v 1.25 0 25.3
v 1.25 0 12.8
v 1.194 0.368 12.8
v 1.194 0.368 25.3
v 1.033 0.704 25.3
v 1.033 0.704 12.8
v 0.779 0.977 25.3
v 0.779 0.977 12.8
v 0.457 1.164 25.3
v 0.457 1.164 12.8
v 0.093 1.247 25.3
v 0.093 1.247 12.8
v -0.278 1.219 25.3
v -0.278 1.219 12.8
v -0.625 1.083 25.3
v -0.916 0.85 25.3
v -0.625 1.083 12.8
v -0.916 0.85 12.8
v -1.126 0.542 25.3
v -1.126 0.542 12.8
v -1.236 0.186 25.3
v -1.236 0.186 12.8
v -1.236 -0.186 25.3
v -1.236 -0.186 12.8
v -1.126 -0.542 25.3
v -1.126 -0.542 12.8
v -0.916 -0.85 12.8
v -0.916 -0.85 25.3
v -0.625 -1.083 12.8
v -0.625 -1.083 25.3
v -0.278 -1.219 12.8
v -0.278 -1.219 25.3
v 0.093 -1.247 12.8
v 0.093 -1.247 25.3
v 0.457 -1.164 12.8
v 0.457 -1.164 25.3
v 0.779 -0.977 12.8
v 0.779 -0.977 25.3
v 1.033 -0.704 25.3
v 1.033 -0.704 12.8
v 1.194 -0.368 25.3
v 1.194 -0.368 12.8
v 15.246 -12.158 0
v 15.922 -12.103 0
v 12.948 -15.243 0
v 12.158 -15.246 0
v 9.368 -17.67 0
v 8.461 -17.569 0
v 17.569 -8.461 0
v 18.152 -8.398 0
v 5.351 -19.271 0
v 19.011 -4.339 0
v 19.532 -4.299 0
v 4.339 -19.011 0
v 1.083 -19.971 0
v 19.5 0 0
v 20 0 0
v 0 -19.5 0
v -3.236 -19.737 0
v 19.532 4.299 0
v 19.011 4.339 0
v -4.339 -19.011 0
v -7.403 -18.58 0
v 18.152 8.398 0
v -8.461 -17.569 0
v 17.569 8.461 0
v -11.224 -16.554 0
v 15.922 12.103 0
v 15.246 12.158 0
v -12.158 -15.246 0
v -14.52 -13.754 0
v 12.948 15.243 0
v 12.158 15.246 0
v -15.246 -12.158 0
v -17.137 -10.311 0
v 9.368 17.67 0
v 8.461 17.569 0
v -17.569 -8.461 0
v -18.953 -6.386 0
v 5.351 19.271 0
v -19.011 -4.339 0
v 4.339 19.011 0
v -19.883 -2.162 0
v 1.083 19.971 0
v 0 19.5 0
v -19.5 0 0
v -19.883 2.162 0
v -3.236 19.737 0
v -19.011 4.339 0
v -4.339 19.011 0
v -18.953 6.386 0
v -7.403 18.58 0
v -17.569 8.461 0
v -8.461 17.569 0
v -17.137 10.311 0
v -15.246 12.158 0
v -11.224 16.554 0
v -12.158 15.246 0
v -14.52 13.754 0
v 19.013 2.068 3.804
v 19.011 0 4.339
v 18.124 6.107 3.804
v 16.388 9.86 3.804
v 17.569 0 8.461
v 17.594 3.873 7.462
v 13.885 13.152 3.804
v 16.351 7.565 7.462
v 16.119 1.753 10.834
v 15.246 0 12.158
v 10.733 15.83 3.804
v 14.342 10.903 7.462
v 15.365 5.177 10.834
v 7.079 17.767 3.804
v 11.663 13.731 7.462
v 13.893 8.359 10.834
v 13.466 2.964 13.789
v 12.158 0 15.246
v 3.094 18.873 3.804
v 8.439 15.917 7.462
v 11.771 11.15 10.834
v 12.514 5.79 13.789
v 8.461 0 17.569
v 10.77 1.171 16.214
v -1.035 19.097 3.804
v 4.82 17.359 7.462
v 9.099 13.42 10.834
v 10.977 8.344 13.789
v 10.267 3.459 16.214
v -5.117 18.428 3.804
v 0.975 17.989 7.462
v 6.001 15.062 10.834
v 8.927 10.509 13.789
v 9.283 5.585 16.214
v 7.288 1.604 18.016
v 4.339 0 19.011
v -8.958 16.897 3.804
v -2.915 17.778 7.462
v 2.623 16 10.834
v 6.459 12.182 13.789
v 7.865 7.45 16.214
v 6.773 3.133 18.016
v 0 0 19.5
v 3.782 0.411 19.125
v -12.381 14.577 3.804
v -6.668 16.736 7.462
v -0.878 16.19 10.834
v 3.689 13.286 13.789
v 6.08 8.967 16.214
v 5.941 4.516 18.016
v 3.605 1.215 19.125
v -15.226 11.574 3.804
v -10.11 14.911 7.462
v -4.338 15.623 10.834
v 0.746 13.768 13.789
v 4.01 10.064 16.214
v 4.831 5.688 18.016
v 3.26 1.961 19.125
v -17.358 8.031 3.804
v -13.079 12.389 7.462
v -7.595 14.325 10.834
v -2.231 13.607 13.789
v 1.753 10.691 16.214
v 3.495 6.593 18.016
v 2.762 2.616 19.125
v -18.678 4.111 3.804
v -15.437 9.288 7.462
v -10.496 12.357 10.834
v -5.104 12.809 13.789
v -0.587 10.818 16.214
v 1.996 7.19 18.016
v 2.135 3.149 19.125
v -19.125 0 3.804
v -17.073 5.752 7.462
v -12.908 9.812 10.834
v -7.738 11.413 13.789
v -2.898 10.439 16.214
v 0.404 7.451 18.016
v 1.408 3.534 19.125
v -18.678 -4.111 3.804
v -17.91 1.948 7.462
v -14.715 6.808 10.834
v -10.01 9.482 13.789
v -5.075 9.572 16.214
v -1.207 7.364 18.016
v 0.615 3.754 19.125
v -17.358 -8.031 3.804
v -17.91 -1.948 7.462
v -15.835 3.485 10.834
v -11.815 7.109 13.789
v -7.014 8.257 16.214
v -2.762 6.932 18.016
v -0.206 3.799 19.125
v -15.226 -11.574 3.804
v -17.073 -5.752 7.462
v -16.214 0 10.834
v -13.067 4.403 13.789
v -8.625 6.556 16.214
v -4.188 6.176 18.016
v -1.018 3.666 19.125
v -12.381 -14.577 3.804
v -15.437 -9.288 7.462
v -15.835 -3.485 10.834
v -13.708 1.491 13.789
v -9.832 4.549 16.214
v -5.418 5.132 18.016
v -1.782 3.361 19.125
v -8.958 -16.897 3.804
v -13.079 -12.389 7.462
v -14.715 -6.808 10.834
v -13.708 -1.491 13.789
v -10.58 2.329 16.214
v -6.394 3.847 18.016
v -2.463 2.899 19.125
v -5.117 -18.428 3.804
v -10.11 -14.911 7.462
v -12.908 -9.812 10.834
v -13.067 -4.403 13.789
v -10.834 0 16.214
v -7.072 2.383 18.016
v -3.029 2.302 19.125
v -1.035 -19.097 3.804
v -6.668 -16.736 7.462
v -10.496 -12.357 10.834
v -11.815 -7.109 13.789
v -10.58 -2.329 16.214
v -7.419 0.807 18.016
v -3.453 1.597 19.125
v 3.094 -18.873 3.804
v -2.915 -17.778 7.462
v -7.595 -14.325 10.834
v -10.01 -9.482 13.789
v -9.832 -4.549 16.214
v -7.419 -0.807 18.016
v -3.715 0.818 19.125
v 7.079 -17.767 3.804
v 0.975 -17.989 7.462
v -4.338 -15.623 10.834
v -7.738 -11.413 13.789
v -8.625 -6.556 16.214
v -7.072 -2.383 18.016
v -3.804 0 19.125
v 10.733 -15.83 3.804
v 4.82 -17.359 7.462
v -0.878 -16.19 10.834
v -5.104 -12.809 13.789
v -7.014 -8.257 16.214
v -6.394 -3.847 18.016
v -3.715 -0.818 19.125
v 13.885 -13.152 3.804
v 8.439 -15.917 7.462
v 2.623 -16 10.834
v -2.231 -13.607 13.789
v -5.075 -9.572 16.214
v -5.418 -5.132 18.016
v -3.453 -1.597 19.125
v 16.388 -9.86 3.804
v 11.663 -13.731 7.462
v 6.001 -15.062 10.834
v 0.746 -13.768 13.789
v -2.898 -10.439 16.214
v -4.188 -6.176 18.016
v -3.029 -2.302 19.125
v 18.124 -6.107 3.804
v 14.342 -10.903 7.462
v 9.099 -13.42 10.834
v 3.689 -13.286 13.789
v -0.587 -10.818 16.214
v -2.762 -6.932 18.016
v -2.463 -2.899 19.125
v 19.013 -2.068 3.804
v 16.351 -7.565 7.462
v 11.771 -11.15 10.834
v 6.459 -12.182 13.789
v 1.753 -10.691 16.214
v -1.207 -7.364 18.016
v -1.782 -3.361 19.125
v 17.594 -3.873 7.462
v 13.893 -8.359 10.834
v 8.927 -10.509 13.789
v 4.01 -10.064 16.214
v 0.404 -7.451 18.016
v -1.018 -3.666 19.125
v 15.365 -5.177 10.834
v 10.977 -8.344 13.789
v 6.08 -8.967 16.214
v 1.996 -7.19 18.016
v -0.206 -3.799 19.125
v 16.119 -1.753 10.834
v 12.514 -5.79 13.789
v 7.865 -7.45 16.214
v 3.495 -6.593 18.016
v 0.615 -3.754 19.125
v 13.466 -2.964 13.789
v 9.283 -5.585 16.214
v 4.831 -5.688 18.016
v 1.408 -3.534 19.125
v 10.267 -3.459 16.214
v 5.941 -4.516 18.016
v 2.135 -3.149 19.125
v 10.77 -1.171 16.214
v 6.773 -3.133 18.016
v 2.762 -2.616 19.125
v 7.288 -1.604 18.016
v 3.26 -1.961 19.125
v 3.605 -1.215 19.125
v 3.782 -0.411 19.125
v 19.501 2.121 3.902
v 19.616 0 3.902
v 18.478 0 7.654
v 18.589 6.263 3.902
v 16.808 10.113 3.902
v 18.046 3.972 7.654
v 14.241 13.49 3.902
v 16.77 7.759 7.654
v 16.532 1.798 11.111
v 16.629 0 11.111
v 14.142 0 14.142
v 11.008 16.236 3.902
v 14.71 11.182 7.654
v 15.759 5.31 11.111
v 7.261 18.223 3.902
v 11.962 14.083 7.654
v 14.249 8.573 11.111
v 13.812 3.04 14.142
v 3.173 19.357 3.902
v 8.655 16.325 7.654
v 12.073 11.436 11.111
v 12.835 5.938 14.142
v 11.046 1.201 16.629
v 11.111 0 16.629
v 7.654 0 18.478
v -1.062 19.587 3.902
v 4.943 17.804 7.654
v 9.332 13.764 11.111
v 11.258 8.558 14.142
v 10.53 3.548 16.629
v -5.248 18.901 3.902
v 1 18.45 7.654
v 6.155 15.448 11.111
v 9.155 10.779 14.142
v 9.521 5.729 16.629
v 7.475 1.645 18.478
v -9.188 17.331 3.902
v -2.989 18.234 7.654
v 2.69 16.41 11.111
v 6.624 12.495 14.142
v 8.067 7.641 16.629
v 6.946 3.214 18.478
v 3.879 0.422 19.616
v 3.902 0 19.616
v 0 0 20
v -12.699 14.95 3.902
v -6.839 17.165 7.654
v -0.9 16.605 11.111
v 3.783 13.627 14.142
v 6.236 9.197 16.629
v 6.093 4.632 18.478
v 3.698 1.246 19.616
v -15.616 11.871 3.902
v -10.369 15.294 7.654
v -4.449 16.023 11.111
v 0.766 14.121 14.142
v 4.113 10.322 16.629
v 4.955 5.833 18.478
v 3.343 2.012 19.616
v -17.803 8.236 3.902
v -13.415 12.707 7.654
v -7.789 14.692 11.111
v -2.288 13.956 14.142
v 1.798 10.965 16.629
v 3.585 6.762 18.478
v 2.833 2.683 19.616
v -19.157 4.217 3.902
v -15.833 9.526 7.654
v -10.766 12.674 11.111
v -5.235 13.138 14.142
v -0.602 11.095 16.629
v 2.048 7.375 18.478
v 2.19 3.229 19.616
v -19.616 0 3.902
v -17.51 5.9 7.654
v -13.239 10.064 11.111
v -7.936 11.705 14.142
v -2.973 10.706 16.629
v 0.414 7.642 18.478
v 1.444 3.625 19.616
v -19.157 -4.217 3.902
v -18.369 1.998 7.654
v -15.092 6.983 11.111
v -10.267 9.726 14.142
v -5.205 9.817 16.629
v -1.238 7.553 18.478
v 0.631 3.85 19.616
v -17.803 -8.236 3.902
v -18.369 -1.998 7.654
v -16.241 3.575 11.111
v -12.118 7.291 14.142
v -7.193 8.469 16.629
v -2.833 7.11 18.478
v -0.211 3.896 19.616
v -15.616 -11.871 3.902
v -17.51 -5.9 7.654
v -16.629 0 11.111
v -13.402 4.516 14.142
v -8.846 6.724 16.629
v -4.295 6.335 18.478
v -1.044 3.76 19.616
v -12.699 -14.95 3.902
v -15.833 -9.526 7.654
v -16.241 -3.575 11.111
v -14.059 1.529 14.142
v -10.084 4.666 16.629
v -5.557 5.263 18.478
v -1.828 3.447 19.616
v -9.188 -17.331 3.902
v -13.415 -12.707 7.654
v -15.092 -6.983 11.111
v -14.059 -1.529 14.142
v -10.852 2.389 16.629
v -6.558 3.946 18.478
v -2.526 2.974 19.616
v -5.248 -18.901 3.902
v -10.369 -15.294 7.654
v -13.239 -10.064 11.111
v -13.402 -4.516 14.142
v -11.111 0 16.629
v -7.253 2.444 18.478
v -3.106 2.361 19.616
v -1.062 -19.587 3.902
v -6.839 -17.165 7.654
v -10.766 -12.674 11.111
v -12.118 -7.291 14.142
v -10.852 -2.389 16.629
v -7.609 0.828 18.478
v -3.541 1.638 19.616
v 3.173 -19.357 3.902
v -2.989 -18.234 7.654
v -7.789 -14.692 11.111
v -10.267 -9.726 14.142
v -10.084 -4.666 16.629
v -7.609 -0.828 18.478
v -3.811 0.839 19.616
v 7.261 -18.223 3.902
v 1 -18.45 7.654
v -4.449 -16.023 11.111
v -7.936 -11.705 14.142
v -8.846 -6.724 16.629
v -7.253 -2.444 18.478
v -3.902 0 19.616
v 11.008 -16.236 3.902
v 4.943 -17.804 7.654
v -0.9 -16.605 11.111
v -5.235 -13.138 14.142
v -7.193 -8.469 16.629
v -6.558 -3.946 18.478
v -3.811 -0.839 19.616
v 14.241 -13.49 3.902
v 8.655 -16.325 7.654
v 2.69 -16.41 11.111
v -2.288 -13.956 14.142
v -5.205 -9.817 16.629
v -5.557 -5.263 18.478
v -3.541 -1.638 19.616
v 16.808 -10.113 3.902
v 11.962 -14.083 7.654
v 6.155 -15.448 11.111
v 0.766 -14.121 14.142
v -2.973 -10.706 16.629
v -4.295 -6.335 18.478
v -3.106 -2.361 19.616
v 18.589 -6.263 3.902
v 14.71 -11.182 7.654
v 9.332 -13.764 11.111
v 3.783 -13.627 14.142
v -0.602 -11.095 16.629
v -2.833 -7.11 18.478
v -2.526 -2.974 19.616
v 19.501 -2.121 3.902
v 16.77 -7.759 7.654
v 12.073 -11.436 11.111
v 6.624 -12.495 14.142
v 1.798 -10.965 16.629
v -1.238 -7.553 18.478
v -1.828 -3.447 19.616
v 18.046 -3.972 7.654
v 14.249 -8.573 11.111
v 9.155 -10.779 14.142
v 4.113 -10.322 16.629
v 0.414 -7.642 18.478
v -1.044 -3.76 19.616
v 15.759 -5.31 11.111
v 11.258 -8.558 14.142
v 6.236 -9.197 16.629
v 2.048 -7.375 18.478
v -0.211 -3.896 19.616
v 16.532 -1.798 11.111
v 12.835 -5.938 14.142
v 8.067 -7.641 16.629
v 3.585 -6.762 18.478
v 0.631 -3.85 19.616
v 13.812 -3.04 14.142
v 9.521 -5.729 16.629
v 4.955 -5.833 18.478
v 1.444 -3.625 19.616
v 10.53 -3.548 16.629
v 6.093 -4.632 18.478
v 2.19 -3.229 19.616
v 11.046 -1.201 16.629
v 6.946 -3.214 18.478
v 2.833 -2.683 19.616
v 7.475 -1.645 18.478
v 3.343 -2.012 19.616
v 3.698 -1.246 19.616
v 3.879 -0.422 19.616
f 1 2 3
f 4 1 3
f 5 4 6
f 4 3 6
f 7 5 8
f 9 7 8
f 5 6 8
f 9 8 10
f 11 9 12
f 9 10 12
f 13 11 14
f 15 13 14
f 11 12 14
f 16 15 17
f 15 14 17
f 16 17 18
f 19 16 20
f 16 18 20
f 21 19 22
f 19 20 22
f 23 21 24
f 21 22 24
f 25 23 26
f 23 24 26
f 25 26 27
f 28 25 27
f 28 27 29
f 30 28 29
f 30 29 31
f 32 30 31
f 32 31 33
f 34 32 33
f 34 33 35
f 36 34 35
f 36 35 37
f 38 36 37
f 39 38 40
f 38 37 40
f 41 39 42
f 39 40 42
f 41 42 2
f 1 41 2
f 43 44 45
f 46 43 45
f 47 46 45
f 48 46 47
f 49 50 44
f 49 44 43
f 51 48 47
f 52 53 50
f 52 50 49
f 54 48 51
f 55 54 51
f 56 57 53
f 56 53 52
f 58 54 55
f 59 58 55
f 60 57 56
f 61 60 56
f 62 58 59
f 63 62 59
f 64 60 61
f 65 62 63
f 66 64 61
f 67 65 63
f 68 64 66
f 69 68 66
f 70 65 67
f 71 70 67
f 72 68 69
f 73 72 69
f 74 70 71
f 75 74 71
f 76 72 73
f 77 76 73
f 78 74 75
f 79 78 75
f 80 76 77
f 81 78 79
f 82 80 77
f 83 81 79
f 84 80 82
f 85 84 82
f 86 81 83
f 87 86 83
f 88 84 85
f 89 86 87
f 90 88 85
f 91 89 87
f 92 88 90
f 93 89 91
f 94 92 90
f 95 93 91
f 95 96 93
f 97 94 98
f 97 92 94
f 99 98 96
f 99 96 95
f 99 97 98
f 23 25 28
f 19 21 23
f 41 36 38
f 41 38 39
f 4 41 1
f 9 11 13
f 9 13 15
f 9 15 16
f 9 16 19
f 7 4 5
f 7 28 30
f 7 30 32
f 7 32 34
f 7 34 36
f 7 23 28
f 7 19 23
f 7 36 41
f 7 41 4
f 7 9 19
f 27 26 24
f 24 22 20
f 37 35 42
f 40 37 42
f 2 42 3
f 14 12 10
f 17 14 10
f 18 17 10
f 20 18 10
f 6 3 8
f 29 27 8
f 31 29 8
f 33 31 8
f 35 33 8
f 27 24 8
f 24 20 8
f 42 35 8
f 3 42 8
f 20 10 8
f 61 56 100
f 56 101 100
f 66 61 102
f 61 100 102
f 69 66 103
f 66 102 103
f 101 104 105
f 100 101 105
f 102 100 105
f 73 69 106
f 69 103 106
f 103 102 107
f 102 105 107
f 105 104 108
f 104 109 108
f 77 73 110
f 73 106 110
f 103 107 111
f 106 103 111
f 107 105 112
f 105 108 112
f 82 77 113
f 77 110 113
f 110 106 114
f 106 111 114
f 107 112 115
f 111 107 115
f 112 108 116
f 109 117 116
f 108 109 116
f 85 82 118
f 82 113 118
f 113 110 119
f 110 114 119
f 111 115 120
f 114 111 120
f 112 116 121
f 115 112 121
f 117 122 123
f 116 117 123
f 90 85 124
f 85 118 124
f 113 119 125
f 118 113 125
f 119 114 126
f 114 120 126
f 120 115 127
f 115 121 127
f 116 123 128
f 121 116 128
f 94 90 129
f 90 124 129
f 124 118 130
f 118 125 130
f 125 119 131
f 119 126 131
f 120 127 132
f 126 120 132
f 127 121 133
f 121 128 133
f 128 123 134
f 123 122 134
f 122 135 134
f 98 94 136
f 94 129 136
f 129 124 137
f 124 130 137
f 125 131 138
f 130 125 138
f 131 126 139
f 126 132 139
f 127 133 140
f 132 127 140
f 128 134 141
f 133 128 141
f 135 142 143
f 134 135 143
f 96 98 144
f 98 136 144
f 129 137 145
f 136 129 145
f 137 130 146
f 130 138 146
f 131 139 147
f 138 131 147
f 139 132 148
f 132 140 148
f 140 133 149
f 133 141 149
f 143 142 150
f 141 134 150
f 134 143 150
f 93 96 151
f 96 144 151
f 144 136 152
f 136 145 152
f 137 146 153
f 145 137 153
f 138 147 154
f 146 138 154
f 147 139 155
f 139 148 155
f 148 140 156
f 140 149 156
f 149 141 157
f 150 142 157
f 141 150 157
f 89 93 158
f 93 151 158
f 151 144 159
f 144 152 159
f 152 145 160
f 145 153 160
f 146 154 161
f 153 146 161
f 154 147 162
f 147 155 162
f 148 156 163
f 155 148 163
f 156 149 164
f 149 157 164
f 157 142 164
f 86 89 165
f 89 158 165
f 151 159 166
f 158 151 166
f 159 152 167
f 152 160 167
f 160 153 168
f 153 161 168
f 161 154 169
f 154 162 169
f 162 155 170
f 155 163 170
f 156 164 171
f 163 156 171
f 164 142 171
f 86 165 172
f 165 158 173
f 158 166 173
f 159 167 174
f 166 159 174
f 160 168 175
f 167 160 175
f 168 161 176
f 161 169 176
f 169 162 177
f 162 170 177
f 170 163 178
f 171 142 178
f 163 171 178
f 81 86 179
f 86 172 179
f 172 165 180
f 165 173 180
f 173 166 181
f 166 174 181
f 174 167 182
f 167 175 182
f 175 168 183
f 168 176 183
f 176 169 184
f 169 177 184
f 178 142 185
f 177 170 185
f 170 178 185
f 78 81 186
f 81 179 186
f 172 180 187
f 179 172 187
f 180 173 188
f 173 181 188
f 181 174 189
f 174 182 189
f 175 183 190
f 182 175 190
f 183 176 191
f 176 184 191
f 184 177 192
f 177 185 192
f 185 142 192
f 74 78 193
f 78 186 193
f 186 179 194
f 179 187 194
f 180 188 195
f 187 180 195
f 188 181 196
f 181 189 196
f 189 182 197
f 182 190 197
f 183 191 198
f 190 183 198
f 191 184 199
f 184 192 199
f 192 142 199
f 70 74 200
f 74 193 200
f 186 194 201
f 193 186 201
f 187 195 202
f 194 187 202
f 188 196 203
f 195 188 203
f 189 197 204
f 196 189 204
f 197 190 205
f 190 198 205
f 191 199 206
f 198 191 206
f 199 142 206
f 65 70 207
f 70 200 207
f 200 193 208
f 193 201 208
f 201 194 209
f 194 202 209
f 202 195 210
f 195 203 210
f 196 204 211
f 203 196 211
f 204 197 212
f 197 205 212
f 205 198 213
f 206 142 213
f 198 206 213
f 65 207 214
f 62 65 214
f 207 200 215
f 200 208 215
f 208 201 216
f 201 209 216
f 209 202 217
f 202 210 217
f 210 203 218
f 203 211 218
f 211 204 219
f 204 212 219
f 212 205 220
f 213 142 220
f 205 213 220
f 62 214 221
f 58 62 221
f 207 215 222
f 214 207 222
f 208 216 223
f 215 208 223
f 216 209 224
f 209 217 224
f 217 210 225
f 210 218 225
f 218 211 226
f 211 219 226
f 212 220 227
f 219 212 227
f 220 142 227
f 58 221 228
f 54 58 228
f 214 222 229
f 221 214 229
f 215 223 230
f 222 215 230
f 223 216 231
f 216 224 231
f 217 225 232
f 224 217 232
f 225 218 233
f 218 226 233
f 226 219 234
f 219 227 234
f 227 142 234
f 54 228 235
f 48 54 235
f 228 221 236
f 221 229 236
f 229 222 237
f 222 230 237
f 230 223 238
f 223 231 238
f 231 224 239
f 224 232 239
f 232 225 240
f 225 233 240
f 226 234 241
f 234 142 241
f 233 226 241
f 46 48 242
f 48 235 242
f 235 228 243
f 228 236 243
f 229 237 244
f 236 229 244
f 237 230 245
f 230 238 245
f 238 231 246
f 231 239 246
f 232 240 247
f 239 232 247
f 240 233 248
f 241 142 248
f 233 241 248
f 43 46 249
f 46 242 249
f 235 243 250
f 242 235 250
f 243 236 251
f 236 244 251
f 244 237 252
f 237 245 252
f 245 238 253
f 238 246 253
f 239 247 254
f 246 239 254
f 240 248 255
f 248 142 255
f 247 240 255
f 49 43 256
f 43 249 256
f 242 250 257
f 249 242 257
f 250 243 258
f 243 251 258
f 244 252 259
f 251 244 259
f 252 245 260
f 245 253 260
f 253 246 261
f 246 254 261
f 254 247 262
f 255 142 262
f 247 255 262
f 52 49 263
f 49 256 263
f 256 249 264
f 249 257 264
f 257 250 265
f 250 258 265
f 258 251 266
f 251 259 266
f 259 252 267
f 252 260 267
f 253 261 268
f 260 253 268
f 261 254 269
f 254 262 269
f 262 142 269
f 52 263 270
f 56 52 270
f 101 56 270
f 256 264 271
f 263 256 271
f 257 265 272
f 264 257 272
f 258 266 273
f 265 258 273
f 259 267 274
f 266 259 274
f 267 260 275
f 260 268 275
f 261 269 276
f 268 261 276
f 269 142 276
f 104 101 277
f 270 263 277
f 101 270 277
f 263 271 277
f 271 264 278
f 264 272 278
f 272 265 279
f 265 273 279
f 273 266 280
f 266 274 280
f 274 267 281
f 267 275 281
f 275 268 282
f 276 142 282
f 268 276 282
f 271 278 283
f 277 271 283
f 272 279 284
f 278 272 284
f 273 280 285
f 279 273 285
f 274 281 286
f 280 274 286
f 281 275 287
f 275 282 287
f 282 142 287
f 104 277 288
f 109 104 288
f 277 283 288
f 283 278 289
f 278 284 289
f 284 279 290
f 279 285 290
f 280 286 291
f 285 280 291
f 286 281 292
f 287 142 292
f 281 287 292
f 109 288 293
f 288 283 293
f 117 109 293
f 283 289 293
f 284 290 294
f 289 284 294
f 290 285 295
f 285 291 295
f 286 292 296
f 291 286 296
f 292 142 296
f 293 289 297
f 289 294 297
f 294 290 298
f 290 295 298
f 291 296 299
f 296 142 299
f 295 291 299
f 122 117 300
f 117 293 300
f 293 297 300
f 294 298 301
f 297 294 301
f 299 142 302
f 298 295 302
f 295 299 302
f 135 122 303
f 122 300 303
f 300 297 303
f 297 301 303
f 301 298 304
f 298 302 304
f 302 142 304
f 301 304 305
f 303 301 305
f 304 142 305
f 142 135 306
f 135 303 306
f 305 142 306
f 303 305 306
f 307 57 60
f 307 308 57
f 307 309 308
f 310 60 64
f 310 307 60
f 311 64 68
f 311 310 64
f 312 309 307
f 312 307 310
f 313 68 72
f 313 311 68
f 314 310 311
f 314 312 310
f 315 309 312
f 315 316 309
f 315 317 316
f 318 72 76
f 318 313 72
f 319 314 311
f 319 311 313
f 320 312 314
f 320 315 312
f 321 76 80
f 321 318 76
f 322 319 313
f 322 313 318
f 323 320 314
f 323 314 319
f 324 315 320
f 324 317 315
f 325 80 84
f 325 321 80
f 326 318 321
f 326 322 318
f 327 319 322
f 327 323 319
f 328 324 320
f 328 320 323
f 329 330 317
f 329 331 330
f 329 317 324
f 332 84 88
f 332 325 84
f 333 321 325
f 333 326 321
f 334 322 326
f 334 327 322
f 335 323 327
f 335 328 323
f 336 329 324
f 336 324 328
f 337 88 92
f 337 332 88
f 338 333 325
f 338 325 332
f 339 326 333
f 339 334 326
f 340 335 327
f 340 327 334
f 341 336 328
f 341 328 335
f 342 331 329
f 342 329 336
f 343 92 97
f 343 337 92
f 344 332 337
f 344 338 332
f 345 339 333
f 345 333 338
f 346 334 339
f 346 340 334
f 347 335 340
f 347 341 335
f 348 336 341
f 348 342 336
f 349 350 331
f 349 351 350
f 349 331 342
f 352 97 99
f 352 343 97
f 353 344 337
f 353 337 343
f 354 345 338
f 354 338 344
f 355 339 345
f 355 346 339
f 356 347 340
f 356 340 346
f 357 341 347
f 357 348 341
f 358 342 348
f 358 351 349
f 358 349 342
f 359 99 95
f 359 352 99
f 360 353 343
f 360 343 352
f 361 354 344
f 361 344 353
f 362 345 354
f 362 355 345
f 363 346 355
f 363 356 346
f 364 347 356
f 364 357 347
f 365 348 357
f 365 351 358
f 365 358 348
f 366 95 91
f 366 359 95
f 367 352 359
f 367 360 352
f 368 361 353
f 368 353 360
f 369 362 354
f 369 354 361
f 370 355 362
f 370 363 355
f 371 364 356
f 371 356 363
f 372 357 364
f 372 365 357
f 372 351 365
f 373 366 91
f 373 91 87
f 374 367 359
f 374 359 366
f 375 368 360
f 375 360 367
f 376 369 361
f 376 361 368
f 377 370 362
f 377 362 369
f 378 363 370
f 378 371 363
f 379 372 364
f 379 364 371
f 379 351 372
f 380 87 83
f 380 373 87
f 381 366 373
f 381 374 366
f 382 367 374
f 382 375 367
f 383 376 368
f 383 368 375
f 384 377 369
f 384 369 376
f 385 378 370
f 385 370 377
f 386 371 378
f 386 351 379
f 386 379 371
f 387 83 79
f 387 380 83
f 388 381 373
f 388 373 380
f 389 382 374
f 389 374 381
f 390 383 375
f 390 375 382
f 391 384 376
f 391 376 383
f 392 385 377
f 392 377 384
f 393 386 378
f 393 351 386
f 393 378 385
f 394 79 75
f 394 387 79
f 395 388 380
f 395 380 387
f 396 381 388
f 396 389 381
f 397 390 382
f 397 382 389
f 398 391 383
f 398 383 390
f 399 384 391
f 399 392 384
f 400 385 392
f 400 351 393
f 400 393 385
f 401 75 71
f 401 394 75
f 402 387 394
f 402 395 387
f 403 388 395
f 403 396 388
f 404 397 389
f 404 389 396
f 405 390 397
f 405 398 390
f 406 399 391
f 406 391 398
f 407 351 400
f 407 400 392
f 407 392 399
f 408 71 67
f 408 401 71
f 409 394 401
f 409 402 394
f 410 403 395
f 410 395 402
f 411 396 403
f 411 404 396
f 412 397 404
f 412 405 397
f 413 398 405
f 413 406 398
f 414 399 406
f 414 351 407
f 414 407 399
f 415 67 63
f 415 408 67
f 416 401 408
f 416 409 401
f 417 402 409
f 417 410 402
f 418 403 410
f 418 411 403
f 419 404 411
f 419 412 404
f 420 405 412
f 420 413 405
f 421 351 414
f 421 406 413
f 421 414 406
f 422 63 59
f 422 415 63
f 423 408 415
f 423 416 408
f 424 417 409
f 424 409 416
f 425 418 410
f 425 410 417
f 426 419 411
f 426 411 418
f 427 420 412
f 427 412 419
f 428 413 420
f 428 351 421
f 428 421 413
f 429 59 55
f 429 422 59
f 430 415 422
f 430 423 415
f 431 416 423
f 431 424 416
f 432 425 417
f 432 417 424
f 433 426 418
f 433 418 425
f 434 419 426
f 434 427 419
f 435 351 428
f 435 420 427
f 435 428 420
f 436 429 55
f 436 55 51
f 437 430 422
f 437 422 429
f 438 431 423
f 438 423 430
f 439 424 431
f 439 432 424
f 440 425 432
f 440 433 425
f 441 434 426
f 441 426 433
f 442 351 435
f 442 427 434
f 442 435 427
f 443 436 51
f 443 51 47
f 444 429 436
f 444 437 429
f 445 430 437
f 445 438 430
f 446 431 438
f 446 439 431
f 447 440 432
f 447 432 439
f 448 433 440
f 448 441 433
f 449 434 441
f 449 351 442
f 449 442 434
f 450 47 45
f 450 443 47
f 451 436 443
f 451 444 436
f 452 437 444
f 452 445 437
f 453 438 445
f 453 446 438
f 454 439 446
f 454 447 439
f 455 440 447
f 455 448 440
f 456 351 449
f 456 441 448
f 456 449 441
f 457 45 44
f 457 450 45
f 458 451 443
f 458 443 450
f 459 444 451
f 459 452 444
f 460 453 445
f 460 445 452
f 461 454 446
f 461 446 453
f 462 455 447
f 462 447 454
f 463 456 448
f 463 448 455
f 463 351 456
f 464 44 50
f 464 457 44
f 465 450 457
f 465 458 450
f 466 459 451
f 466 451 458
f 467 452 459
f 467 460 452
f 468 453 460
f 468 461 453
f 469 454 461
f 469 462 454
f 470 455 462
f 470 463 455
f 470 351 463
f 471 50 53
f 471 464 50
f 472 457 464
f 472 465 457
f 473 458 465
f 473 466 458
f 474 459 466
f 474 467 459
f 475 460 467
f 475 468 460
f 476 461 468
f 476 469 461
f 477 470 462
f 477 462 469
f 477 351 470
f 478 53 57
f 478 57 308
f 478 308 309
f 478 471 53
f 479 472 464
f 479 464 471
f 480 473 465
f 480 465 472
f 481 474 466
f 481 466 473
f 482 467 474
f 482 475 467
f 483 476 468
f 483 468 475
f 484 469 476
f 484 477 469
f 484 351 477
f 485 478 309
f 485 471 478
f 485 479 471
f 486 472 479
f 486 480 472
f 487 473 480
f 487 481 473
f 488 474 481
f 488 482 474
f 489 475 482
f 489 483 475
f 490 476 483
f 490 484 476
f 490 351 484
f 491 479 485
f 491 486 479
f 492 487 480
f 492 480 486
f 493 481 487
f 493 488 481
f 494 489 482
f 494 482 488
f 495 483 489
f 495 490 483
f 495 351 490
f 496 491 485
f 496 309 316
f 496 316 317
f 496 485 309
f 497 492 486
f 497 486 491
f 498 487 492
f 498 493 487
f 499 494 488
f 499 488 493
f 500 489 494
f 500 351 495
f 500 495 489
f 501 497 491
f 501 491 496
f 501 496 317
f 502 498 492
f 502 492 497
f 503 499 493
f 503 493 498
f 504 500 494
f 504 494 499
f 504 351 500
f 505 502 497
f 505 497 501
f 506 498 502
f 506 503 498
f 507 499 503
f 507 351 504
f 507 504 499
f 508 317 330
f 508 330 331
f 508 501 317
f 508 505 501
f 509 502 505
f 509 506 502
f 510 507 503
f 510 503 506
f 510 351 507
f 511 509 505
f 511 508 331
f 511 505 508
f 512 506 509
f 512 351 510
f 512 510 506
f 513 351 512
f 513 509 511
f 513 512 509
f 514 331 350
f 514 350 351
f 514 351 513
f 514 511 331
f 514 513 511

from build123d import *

# Parameters (mm, degrees)
F2_T     = -0.5
F4_R     = 1.25
F5_DEPTH = 12.5


with BuildPart() as f1:
    # F0 (on Front) → F1 (revolve)
    with BuildSketch(Plane.XZ):
        with BuildLine():
            Line((0, 20), (0, 0))
            Line((0, 0), (20, 0))
            ThreePointArc((20, 0), (14.1421356237, 14.1421356237), (0, 20))
        make_face()
    revolve(axis=Axis((0, 0, 10), (0, 0, 1)))

    # F2
    f2_openings = [f1.faces().sort_by_distance(p)[0] for p in [
        (0, 0, 0),
    ]]
    offset(amount=F2_T, openings=f2_openings)


with BuildPart() as f5:
    # F4 (on offset) → F5 (new body)
    with BuildSketch(Plane.XY.offset(12.8)):
        Circle(F4_R)
    extrude(amount=F5_DEPTH)


solid = Compound([f1.part, f5.part])
